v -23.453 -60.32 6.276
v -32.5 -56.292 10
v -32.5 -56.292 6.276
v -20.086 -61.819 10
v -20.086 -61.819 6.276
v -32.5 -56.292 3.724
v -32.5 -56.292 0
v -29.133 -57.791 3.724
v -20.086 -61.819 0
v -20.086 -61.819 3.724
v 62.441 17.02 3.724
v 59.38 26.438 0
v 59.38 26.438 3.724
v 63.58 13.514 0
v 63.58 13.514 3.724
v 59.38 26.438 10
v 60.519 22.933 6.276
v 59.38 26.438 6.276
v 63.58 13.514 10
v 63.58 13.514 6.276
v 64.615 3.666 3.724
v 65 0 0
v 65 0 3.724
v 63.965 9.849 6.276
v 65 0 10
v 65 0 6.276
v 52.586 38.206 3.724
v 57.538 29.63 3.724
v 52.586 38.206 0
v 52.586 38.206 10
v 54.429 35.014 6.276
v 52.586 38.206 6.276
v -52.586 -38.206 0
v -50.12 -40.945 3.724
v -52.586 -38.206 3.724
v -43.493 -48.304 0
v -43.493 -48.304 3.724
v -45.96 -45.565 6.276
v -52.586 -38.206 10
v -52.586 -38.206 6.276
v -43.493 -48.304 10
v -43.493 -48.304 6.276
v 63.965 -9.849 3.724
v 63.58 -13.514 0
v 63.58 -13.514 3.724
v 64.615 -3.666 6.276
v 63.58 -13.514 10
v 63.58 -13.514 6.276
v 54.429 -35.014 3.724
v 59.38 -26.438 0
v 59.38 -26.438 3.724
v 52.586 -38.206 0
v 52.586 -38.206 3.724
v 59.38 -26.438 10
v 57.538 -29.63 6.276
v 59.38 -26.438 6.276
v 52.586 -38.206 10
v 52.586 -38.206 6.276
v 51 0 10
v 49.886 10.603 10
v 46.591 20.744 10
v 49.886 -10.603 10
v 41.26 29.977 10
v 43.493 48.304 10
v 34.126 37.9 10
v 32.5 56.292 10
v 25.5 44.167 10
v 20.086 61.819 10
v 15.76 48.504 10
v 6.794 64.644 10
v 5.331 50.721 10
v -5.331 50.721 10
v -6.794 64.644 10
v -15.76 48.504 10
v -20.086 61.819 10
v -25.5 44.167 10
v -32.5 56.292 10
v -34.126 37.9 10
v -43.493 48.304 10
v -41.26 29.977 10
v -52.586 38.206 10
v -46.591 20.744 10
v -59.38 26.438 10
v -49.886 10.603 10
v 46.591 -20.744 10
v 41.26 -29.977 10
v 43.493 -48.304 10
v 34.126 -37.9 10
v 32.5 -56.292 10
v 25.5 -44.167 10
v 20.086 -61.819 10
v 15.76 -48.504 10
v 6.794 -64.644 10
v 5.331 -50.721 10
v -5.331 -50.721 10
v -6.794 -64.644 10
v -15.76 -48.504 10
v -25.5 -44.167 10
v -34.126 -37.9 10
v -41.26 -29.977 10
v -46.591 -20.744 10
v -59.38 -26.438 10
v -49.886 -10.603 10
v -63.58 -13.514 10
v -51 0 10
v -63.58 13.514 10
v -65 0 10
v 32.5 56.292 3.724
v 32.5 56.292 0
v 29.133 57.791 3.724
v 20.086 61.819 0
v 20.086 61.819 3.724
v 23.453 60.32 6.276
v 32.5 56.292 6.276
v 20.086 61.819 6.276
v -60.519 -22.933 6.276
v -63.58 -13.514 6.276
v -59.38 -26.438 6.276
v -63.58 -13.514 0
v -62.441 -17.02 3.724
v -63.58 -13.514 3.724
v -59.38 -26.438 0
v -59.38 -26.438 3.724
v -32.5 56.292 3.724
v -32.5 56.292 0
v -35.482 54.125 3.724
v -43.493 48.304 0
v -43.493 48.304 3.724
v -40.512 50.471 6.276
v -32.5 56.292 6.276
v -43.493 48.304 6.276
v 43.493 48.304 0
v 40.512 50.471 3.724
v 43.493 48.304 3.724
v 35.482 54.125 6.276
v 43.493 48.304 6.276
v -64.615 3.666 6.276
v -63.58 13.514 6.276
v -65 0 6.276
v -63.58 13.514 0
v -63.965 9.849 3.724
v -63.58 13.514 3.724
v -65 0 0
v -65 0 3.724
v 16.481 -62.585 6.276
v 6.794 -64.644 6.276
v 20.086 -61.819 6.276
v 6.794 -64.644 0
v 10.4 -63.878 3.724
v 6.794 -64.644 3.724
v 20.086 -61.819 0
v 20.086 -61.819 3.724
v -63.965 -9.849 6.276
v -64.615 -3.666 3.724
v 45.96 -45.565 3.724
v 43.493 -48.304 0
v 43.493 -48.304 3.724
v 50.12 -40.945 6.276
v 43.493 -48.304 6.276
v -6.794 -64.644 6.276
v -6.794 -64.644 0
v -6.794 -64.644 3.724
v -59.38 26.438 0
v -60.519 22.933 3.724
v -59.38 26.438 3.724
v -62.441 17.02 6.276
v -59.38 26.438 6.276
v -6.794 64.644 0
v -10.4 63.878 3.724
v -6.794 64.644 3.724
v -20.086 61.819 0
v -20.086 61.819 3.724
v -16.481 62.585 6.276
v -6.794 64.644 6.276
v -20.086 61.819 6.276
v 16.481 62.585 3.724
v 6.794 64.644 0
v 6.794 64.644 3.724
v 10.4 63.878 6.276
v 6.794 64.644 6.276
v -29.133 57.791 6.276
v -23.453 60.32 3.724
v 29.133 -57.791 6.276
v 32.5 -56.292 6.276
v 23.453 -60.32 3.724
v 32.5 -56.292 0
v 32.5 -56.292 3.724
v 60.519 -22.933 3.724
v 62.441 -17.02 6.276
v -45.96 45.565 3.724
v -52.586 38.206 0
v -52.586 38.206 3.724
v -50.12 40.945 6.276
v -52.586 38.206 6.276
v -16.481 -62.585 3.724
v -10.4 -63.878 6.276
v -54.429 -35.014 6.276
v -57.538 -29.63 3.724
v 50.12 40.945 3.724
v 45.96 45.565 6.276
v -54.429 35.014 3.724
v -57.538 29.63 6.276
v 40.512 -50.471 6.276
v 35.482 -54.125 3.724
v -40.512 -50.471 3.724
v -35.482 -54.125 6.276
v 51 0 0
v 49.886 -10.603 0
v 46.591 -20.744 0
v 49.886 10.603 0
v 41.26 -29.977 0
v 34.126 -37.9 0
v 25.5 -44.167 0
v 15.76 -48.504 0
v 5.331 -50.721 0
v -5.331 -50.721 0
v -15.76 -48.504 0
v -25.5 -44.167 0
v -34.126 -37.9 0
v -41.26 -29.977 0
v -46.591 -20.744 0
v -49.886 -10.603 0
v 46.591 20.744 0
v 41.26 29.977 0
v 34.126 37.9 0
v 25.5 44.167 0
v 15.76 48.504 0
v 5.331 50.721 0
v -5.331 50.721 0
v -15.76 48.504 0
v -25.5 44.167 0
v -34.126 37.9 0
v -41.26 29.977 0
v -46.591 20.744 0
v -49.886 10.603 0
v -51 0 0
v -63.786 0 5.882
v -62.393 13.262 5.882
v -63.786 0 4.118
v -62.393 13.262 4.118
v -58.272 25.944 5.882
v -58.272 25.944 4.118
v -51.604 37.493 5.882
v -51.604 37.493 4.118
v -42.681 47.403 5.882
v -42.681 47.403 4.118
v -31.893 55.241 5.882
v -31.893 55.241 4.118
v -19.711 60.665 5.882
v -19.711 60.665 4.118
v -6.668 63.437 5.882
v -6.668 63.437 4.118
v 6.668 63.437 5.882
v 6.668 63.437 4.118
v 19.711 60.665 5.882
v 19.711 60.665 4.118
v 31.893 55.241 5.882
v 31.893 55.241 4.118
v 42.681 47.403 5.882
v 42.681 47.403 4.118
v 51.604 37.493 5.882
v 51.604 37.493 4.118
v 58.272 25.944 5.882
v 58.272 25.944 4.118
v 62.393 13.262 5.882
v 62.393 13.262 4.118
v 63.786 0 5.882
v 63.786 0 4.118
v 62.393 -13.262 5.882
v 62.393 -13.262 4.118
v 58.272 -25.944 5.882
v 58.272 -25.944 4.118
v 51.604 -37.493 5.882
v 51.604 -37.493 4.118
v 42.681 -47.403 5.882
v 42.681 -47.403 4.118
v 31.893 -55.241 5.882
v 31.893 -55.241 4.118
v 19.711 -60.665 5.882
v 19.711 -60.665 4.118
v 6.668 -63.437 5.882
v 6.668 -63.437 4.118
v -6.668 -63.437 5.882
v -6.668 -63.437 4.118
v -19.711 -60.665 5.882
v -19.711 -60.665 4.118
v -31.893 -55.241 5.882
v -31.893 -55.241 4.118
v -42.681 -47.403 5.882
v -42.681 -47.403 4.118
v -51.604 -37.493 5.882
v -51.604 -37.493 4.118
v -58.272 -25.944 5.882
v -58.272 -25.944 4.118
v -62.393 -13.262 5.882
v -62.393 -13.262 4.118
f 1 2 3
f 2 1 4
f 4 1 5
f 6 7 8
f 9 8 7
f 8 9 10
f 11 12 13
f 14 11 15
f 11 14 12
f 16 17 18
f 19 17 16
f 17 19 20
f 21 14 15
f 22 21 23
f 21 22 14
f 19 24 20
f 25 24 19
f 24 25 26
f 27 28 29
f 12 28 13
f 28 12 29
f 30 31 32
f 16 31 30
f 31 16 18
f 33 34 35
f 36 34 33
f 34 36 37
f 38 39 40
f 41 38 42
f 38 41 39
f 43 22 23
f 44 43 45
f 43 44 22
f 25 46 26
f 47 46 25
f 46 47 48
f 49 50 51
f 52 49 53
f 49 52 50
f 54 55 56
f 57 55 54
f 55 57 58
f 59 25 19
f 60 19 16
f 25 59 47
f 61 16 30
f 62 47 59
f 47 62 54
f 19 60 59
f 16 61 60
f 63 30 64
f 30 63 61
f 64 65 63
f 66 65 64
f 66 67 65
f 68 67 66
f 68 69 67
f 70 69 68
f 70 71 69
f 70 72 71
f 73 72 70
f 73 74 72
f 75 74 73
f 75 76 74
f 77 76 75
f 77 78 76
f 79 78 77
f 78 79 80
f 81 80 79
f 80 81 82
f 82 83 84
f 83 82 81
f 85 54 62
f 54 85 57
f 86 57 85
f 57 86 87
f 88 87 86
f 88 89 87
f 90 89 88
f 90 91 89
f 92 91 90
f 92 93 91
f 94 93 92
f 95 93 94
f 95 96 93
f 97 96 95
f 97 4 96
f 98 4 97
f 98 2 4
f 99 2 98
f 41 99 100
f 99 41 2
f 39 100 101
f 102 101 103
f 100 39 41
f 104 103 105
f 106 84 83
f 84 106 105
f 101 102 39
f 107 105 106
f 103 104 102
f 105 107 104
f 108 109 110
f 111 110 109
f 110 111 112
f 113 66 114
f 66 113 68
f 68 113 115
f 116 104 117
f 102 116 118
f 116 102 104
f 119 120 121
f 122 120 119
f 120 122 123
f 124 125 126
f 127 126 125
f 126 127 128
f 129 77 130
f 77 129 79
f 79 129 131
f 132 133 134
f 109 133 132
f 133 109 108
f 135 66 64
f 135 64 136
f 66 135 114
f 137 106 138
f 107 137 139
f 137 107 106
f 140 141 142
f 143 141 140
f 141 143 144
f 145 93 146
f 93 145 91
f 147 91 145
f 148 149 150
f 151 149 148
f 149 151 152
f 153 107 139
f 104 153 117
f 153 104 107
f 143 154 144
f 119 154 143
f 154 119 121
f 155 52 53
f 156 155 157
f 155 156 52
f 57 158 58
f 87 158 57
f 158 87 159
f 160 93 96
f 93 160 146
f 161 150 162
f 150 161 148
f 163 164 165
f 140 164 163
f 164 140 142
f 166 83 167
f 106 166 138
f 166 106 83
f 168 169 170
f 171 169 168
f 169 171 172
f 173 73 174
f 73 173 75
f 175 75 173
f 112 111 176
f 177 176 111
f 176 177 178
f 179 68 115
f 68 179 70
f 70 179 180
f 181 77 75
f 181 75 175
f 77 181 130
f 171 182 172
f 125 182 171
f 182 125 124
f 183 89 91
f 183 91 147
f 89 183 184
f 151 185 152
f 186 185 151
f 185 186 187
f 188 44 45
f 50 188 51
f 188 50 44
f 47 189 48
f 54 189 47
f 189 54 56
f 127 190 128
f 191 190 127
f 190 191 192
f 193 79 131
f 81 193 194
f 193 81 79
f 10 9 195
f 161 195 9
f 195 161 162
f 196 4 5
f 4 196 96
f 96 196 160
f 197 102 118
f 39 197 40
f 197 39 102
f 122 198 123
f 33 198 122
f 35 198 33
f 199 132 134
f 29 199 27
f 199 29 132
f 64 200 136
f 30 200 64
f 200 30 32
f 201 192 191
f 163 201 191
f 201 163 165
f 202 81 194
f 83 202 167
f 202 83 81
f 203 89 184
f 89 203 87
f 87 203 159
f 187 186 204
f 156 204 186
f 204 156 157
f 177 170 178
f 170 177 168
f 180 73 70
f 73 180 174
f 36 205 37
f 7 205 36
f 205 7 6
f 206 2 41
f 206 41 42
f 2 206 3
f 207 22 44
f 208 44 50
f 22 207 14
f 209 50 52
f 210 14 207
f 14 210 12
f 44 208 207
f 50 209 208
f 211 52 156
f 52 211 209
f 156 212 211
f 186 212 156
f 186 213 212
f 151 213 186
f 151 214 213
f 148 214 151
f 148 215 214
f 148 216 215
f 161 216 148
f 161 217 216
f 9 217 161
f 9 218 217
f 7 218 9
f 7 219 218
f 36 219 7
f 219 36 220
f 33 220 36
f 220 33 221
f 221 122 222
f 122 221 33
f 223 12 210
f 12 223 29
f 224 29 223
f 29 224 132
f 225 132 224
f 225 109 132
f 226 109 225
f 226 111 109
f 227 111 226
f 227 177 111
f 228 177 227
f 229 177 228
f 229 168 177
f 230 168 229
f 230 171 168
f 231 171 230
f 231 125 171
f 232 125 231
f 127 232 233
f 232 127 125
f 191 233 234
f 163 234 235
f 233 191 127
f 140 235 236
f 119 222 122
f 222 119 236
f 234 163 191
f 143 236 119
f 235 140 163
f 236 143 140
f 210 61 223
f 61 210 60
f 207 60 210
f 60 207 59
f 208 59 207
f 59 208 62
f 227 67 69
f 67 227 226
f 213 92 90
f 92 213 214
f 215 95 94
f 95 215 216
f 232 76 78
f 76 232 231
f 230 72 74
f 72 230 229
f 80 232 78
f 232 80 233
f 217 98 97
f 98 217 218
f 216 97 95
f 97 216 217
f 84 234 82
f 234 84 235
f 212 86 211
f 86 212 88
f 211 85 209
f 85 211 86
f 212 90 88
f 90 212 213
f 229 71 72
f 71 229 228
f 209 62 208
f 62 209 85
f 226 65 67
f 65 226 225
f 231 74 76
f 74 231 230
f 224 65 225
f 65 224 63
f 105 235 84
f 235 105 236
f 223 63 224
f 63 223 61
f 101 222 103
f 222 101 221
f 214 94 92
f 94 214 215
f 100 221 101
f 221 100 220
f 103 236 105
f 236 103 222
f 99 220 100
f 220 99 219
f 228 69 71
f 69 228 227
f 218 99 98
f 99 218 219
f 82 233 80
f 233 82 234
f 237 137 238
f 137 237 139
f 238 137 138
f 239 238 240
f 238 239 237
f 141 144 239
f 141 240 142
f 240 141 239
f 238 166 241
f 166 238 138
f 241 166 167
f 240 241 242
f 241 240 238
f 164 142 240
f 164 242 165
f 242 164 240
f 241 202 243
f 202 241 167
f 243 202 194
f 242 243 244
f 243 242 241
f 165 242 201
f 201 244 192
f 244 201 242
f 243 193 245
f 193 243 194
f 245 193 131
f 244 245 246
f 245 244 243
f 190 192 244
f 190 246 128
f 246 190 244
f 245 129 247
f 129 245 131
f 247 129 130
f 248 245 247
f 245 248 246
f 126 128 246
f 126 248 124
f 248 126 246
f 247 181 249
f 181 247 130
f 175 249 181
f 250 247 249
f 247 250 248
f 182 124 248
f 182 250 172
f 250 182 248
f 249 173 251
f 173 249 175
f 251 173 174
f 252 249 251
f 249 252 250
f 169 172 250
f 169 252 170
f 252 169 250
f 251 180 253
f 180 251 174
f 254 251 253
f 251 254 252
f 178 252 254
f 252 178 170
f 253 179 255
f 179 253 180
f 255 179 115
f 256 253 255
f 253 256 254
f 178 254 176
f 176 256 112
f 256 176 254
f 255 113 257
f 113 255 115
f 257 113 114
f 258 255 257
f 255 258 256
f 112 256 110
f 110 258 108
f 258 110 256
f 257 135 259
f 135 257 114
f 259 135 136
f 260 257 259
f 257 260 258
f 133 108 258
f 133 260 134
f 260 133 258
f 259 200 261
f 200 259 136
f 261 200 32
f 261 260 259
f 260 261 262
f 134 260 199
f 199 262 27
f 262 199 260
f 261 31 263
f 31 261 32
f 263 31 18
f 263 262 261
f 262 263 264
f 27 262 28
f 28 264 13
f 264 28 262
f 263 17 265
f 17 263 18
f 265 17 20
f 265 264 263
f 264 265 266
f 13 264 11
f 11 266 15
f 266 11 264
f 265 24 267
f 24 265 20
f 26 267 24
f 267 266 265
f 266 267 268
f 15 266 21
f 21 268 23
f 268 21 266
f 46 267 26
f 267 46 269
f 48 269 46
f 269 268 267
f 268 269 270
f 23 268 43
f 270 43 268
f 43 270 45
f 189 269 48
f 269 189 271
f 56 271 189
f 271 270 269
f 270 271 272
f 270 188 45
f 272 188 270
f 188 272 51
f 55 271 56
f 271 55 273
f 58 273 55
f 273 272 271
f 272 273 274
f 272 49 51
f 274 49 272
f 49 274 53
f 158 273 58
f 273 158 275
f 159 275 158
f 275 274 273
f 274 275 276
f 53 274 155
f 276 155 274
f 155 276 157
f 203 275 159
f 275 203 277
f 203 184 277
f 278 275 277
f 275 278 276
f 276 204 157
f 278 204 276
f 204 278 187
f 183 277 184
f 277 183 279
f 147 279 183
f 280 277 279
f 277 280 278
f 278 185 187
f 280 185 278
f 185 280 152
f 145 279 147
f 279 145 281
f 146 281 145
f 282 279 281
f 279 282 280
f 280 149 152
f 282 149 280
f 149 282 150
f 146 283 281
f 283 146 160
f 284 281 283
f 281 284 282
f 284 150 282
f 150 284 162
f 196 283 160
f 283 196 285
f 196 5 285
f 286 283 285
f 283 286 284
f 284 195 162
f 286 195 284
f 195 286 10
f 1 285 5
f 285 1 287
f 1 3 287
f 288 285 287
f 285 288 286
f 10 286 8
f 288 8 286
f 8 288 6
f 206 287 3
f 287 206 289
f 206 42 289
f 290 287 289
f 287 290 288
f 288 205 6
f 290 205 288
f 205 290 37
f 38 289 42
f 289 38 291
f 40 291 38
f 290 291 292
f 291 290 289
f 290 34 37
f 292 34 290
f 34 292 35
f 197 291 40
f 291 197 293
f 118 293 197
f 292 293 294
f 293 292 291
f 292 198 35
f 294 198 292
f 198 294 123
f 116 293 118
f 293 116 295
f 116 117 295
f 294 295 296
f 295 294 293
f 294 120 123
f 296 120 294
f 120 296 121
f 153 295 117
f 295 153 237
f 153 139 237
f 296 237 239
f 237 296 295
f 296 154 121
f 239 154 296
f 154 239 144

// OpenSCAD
/*
ISO-K vacuum flanges for OpenSCAD
This is free and unencumbered software released into the public domain.

Anyone is free to copy, modify, publish, use, compile, sell, or
distribute this software, either in source code form or as a compiled
binary, for any purpose, commercial or non-commercial, and by any
means.

In jurisdictions that recognize copyright laws, the author or authors
of this software dedicate any and all copyright interest in the
software to the public domain. We make this dedication for the benefit
of the public at large and to the detriment of our heirs and
successors. We intend this dedication to be an overt act of
relinquishment in perpetuity of all present and future rights to this
software under copyright law.

THE SOFTWARE IS PROVIDED "AS IS", WITHOUT WARRANTY OF ANY KIND,
EXPRESS OR IMPLIED, INCLUDING BUT NOT LIMITED TO THE WARRANTIES OF
MERCHANTABILITY, FITNESS FOR A PARTICULAR PURPOSE AND NONINFRINGEMENT.
IN NO EVENT SHALL THE AUTHORS BE LIABLE FOR ANY CLAIM, DAMAGES OR
OTHER LIABILITY, WHETHER IN AN ACTION OF CONTRACT, TORT OR OTHERWISE,
ARISING FROM, OUT OF OR IN CONNECTION WITH THE SOFTWARE OR THE USE OR
OTHER DEALINGS IN THE SOFTWARE.

For more information, please refer to <https://unlicense.org/>

Based on blueprints from https://www.tracepartsonline.net/(S(c314dufymcnxxurthiwo4pow))/PartDetails.aspx?PartFamilyID=30-03062015-098588&PartID=30-03062015-098588 (the link is dead at the time of this PR to NopSCADlib), but should not be copyrightable, since based on a standard + the stuff is made of simple geometrical shapes + the file has been created myself, looking at the blueprint.

*/

module ISOKFlange(partLen = 108.0,
	innerDiameter = 102,
	outerDiameter = 108,
	ringWidth = 2.4,
	flangeDiameter = 130,
	flangeSize = 12,
	ridgeDepth = 2,
	grooveRadius = 1.5,
	grooveOffset = 5.0) {
	
	flangeInnerSize = flangeSize-ridgeDepth;
	middleSegmentSize=partLen-flangeInnerSize;

	group() {
		group() {
			difference() {
				difference() {
					cylinder(h = partLen, d = flangeDiameter, center = false);
					cylinder(h = partLen, d = innerDiameter, center = false);
					translate([0,0,partLen-grooveOffset]) {
						rotate_extrude()
						translate([flangeDiameter/2,0,0])
						circle(r = grooveRadius);
					}
				}
				difference() {
					union() {
						cylinder(h = middleSegmentSize, d = flangeDiameter-ringWidth, center = false);
						cylinder(h = partLen-flangeSize, d = flangeDiameter);
					}
					cylinder(h = middleSegmentSize, d = outerDiameter);
				}
			}
		}
	}
}
ISOKFlange(10);  // this file is meant to be imported, not included
